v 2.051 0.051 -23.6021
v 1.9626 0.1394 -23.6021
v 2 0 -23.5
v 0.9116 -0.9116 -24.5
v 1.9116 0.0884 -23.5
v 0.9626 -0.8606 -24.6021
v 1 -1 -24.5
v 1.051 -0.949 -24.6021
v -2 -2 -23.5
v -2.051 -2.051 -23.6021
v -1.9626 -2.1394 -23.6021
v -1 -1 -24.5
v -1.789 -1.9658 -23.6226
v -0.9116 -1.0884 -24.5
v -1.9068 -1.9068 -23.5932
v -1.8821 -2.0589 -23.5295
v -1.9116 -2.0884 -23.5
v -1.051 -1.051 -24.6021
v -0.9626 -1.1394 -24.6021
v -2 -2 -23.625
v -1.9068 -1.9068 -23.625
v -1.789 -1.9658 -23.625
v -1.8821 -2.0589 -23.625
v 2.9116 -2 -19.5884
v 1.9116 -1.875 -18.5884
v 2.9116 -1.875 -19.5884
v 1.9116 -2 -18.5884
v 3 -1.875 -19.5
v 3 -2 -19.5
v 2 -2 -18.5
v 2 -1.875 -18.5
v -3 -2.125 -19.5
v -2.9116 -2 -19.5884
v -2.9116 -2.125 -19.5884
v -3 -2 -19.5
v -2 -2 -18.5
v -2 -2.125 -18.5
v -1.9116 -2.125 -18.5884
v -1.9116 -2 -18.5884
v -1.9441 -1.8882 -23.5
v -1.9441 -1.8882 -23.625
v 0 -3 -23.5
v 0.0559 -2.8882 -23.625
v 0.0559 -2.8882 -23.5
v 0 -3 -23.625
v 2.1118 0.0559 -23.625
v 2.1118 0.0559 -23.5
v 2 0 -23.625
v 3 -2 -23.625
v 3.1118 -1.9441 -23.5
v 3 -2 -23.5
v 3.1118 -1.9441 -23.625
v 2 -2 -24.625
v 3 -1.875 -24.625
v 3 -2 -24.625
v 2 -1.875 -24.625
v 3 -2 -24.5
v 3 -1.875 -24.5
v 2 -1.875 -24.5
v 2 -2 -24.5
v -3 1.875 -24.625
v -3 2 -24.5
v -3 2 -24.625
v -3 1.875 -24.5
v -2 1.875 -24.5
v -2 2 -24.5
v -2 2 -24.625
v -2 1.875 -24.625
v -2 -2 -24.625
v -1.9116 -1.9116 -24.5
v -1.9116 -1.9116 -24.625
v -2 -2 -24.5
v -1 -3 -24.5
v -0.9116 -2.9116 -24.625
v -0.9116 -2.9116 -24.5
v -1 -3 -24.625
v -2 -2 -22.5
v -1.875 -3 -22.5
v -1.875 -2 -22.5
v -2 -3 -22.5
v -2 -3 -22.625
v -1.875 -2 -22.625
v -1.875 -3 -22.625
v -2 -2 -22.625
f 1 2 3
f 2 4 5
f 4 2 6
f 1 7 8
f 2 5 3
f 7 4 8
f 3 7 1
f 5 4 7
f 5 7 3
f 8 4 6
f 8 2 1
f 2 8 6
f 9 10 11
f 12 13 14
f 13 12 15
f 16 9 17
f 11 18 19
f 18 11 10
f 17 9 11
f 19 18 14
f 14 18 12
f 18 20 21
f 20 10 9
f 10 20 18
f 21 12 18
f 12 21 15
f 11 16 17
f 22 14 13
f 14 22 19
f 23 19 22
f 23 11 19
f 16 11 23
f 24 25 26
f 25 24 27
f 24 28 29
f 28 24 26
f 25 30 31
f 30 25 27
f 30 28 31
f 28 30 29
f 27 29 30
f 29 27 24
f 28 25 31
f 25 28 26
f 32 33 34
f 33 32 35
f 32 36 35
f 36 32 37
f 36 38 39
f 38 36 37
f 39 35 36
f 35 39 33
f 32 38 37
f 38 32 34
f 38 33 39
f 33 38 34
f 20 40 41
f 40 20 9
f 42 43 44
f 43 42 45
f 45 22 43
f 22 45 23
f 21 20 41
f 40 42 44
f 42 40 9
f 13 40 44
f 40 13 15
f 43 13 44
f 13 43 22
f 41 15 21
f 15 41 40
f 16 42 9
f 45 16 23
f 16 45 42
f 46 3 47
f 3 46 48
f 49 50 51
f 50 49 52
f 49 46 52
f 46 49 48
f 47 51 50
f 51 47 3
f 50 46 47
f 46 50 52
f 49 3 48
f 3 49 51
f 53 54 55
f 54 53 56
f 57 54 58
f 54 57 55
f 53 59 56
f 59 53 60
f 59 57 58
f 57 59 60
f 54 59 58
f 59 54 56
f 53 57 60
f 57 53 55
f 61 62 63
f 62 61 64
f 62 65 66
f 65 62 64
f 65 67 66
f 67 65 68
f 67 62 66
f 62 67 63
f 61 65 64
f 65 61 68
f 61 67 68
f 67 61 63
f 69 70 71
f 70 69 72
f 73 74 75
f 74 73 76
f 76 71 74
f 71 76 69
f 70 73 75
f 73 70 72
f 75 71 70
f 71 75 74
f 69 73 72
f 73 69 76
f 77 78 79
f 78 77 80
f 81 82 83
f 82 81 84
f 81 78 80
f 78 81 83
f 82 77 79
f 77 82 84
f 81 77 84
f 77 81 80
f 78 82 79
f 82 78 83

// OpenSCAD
translate(v = [-0.5, -0.5, 0]) {
	/*Shell 0*/
	union() {
		%/*Nodes shell 0*/
		union() {
			/*Node $_72*/
			color(alpha = 0.1, c = "yellow") {
				translate(v = [1.0, -1.0, -25.0]) {
					cube(size = [1, 1, 1]);
				}
			}
			/*Node $_50*/
			color(alpha = 0.1, c = "orange") {
				translate(v = [-1.0, -1.0, -25.0]) {
					cube(size = [1, 1, 1]);
				}
			}
		}
		/*Edges shell 0*/
		union() {
			/*Edge 72 from one.pump_b[0].flush to $_72*/
			translate(v = [1.5, -0.5, -24.5]) {
				rotate(a = [0, 54.735610317245346, 45.0]) {
					cube(size = [0.125, 0.125, 1.7320508075688772]);
				}
			}
			/*Edge 50 from one.pump_b[0].hole to $_50*/
			translate(v = [-0.5, -0.5, -24.5]) {
				rotate(a = [0, 54.735610317245346, -135.0]) {
					cube(size = [0.125, 0.125, 1.7320508075688772]);
				}
			}
		}
	}
	/*Shell 1*/
	union() {
		%/*Nodes shell 1*/
		union() {
			/*Node $_66*/
			color(alpha = 0.1, c = "yellow") {
				translate(v = [2.0, -2.0, -19.0]) {
					cube(size = [1, 1, 1]);
				}
			}
			/*Node $_44*/
			color(alpha = 0.1, c = "orange") {
				translate(v = [-2.0, -2.0, -19.0]) {
					cube(size = [1, 1, 1]);
				}
			}
			/*Node $_69*/
			color(alpha = 0.1, c = "yellow") {
				translate(v = [2.0, -2.0, -25.0]) {
					cube(size = [1, 1, 1]);
				}
			}
			/*Node $_47*/
			color(alpha = 0.1, c = "orange") {
				translate(v = [-2.0, 2.0, -25.0]) {
					cube(size = [1, 1, 1]);
				}
			}
			/*Node one.pump_b[0].flush*/
			color(alpha = 0.1, c = "black") {
				translate(v = [2.0, 0.0, -24.0]) {
					cube(size = [1, 1, 1]);
				}
			}
			/*Node one.pump_b[0].hole*/
			color(alpha = 0.1, c = "black") {
				translate(v = [-2.0, -2.0, -24.0]) {
					cube(size = [1, 1, 1]);
				}
			}
			/*Node $_73*/
			color(alpha = 0.1, c = "yellow") {
				translate(v = [-2.0, -2.0, -25.0]) {
					cube(size = [1, 1, 1]);
				}
			}
			/*Node $_51*/
			color(alpha = 0.1, c = "orange") {
				translate(v = [-2.0, -2.0, -23.0]) {
					cube(size = [1, 1, 1]);
				}
			}
		}
		/*Edges shell 1*/
		union() {
			/*Edge 66 from one.ctrl_s[1].flush to $_66*/
			translate(v = [2.5, -1.5, -18.5]) {
				rotate(a = [0, 135.0, 0.0]) {
					cube(size = [0.125, 0.125, 1.4142135623730951]);
				}
			}
			/*Edge 44 from one.ctrl_s[1].hole to $_44*/
			translate(v = [-1.5, -1.5, -18.5]) {
				rotate(a = [0, 135.0, 180.0]) {
					cube(size = [0.125, 0.125, 1.4142135623730951]);
				}
			}
			/*Edge 151 from one.devices[0].thingy.vp3.thing to one.pump_b[0].hole*/
			translate(v = [-1.5, -1.5, -23.5]) {
				rotate(a = [0, 90.0, -26.56505117707799]) {
					cube(size = [0.125, 0.125, 2.23606797749979]);
				}
			}
			/*Edge 285 from one.devices[3].thingy.vp3.thing to one.pump_b[0].flush*/
			translate(v = [2.5, 0.5, -23.5]) {
				rotate(a = [0, 90.0, -63.43494882292201]) {
					cube(size = [0.125, 0.125, 2.23606797749979]);
				}
			}
			/*Edge 69 from one.pump_a[0].flush to $_69*/
			translate(v = [2.5, -1.5, -24.5]) {
				rotate(a = [0, 90.0, 0.0]) {
					cube(size = [0.125, 0.125, 1.0]);
				}
			}
			/*Edge 47 from one.pump_a[0].hole to $_47*/
			translate(v = [-1.5, 2.5, -24.5]) {
				rotate(a = [0, 90.0, 180.0]) {
					cube(size = [0.125, 0.125, 1.0]);
				}
			}
			/*Edge 73 from one.pump_b[1].flush to $_73*/
			translate(v = [-1.5, -1.5, -24.5]) {
				rotate(a = [0, 90.0, -45.0]) {
					cube(size = [0.125, 0.125, 1.4142135623730951]);
				}
			}
			/*Edge 51 from one.pump_b[1].hole to $_51*/
			translate(v = [-1.5, -1.5, -22.5]) {
				rotate(a = [0, 90.0, -90.0]) {
					cube(size = [0.125, 0.125, 1.0]);
				}
			}
		}
	}
	/*Shell 2*/
	union() {
		%/*Nodes shell 2*/
		union() {
			/*Node $_57*/
			color(alpha = 0.1, c = "yellow") {
				translate(v = [3.0, -3.0, -20.0]) {
					cube(size = [1, 1, 1]);
				}
			}
			/*Node $_35*/
			color(alpha = 0.1, c = "orange") {
				translate(v = [-1.0, -3.0, -20.0]) {
					cube(size = [1, 1, 1]);
				}
			}
			/*Node $_58*/
			color(alpha = 0.1, c = "yellow") {
				translate(v = [3.0, 1.0, -20.0]) {
					cube(size = [1, 1, 1]);
				}
			}
			/*Node $_36*/
			color(alpha = 0.1, c = "orange") {
				translate(v = [-3.0, -1.000000000010631, -20.0]) {
					cube(size = [1, 1, 1]);
				}
			}
			/*Node one.ctrl_s[1].flush*/
			color(alpha = 0.1, c = "black") {
				translate(v = [3.0, -2.0, -20.0]) {
					cube(size = [1, 1, 1]);
				}
			}
			/*Node one.ctrl_s[1].hole*/
			color(alpha = 0.1, c = "black") {
				translate(v = [-3.0, -2.0, -20.0]) {
					cube(size = [1, 1, 1]);
				}
			}
			/*Node $_67*/
			color(alpha = 0.1, c = "yellow") {
				translate(v = [3.0, -3.0, -22.0]) {
					cube(size = [1, 1, 1]);
				}
			}
			/*Node $_45*/
			color(alpha = 0.1, c = "orange") {
				translate(v = [-2.0, -3.0, -25.0]) {
					cube(size = [1, 1, 1]);
				}
			}
			/*Node one.devices[0].thingy.column_upper.thing*/
			color(alpha = 0.1, c = "black") {
				translate(v = [0.0, -3.0, -24.999999990303447]) {
					cube(size = [1, 1, 1]);
				}
			}
			/*Node one.devices[0].thingy.vp3.thing*/
			color(alpha = 0.1, c = "black") {
				translate(v = [0.0, -3.0, -24.0]) {
					cube(size = [1, 1, 1]);
				}
			}
			/*Node one.devices[1].thingy.column_upper.thing*/
			color(alpha = 0.1, c = "black") {
				translate(v = [1.0, -3.0, -25.0]) {
					cube(size = [1, 1, 1]);
				}
			}
			/*Node one.devices[1].thingy.vp3.thing*/
			color(alpha = 0.1, c = "black") {
				translate(v = [1.0, -3.0, -24.0]) {
					cube(size = [1, 1, 1]);
				}
			}
			/*Node one.devices[2].thingy.column_upper.thing*/
			color(alpha = 0.1, c = "black") {
				translate(v = [2.000000023224491, -3.0, -24.999999980904875]) {
					cube(size = [1, 1, 1]);
				}
			}
			/*Node one.devices[2].thingy.vp3.thing*/
			color(alpha = 0.1, c = "black") {
				translate(v = [2.000000013572193, -3.0, -24.0]) {
					cube(size = [1, 1, 1]);
				}
			}
			/*Node one.devices[3].thingy.column_upper.thing*/
			color(alpha = 0.1, c = "black") {
				translate(v = [3.0, -2.0, -23.0]) {
					cube(size = [1, 1, 1]);
				}
			}
			/*Node one.devices[3].thingy.vp3.thing*/
			color(alpha = 0.1, c = "black") {
				translate(v = [3.0, -2.0, -24.0]) {
					cube(size = [1, 1, 1]);
				}
			}
			/*Node one.pump_a[0].flush*/
			color(alpha = 0.1, c = "black") {
				translate(v = [3.0, -2.0, -25.0]) {
					cube(size = [1, 1, 1]);
				}
			}
			/*Node one.pump_a[0].hole*/
			color(alpha = 0.1, c = "black") {
				translate(v = [-3.0, 2.0, -25.0]) {
					cube(size = [1, 1, 1]);
				}
			}
			/*Node $_70*/
			color(alpha = 0.1, c = "yellow") {
				translate(v = [3.0, -3.0, -25.0]) {
					cube(size = [1, 1, 1]);
				}
			}
			/*Node $_48*/
			color(alpha = 0.1, c = "orange") {
				translate(v = [-3.0, 1.0, -25.0]) {
					cube(size = [1, 1, 1]);
				}
			}
			/*Node one.pump_b[1].flush*/
			color(alpha = 0.1, c = "black") {
				translate(v = [-1.0, -3.0, -25.0]) {
					cube(size = [1, 1, 1]);
				}
			}
			/*Node one.pump_b[1].hole*/
			color(alpha = 0.1, c = "black") {
				translate(v = [-2.0, -3.0, -23.0]) {
					cube(size = [1, 1, 1]);
				}
			}
		}
		/*Edges shell 2*/
		union();
	}
	/*Shell 3*/
	union() {
		%/*Nodes shell 3*/
		union();
		/*Edges shell 3*/
		union();
	}
	/*Shell 4*/
	union() {
		%/*Nodes shell 4*/
		union();
		/*Edges shell 4*/
		union();
	}
	/*Shell 5*/
	union() {
		%/*Nodes shell 5*/
		union();
		/*Edges shell 5*/
		union();
	}
	/*Shell 6*/
	union() {
		%/*Nodes shell 6*/
		union();
		/*Edges shell 6*/
		union();
	}
	/*Shell 7*/
	union() {
		%/*Nodes shell 7*/
		union();
		/*Edges shell 7*/
		union();
	}
	/*Shell 8*/
	union() {
		%/*Nodes shell 8*/
		union();
		/*Edges shell 8*/
		union();
	}
	/*Shell 9*/
	union() {
		%/*Nodes shell 9*/
		union();
		/*Edges shell 9*/
		union();
	}
	/*Shell 10*/
	union() {
		%/*Nodes shell 10*/
		union();
		/*Edges shell 10*/
		union();
	}
}
